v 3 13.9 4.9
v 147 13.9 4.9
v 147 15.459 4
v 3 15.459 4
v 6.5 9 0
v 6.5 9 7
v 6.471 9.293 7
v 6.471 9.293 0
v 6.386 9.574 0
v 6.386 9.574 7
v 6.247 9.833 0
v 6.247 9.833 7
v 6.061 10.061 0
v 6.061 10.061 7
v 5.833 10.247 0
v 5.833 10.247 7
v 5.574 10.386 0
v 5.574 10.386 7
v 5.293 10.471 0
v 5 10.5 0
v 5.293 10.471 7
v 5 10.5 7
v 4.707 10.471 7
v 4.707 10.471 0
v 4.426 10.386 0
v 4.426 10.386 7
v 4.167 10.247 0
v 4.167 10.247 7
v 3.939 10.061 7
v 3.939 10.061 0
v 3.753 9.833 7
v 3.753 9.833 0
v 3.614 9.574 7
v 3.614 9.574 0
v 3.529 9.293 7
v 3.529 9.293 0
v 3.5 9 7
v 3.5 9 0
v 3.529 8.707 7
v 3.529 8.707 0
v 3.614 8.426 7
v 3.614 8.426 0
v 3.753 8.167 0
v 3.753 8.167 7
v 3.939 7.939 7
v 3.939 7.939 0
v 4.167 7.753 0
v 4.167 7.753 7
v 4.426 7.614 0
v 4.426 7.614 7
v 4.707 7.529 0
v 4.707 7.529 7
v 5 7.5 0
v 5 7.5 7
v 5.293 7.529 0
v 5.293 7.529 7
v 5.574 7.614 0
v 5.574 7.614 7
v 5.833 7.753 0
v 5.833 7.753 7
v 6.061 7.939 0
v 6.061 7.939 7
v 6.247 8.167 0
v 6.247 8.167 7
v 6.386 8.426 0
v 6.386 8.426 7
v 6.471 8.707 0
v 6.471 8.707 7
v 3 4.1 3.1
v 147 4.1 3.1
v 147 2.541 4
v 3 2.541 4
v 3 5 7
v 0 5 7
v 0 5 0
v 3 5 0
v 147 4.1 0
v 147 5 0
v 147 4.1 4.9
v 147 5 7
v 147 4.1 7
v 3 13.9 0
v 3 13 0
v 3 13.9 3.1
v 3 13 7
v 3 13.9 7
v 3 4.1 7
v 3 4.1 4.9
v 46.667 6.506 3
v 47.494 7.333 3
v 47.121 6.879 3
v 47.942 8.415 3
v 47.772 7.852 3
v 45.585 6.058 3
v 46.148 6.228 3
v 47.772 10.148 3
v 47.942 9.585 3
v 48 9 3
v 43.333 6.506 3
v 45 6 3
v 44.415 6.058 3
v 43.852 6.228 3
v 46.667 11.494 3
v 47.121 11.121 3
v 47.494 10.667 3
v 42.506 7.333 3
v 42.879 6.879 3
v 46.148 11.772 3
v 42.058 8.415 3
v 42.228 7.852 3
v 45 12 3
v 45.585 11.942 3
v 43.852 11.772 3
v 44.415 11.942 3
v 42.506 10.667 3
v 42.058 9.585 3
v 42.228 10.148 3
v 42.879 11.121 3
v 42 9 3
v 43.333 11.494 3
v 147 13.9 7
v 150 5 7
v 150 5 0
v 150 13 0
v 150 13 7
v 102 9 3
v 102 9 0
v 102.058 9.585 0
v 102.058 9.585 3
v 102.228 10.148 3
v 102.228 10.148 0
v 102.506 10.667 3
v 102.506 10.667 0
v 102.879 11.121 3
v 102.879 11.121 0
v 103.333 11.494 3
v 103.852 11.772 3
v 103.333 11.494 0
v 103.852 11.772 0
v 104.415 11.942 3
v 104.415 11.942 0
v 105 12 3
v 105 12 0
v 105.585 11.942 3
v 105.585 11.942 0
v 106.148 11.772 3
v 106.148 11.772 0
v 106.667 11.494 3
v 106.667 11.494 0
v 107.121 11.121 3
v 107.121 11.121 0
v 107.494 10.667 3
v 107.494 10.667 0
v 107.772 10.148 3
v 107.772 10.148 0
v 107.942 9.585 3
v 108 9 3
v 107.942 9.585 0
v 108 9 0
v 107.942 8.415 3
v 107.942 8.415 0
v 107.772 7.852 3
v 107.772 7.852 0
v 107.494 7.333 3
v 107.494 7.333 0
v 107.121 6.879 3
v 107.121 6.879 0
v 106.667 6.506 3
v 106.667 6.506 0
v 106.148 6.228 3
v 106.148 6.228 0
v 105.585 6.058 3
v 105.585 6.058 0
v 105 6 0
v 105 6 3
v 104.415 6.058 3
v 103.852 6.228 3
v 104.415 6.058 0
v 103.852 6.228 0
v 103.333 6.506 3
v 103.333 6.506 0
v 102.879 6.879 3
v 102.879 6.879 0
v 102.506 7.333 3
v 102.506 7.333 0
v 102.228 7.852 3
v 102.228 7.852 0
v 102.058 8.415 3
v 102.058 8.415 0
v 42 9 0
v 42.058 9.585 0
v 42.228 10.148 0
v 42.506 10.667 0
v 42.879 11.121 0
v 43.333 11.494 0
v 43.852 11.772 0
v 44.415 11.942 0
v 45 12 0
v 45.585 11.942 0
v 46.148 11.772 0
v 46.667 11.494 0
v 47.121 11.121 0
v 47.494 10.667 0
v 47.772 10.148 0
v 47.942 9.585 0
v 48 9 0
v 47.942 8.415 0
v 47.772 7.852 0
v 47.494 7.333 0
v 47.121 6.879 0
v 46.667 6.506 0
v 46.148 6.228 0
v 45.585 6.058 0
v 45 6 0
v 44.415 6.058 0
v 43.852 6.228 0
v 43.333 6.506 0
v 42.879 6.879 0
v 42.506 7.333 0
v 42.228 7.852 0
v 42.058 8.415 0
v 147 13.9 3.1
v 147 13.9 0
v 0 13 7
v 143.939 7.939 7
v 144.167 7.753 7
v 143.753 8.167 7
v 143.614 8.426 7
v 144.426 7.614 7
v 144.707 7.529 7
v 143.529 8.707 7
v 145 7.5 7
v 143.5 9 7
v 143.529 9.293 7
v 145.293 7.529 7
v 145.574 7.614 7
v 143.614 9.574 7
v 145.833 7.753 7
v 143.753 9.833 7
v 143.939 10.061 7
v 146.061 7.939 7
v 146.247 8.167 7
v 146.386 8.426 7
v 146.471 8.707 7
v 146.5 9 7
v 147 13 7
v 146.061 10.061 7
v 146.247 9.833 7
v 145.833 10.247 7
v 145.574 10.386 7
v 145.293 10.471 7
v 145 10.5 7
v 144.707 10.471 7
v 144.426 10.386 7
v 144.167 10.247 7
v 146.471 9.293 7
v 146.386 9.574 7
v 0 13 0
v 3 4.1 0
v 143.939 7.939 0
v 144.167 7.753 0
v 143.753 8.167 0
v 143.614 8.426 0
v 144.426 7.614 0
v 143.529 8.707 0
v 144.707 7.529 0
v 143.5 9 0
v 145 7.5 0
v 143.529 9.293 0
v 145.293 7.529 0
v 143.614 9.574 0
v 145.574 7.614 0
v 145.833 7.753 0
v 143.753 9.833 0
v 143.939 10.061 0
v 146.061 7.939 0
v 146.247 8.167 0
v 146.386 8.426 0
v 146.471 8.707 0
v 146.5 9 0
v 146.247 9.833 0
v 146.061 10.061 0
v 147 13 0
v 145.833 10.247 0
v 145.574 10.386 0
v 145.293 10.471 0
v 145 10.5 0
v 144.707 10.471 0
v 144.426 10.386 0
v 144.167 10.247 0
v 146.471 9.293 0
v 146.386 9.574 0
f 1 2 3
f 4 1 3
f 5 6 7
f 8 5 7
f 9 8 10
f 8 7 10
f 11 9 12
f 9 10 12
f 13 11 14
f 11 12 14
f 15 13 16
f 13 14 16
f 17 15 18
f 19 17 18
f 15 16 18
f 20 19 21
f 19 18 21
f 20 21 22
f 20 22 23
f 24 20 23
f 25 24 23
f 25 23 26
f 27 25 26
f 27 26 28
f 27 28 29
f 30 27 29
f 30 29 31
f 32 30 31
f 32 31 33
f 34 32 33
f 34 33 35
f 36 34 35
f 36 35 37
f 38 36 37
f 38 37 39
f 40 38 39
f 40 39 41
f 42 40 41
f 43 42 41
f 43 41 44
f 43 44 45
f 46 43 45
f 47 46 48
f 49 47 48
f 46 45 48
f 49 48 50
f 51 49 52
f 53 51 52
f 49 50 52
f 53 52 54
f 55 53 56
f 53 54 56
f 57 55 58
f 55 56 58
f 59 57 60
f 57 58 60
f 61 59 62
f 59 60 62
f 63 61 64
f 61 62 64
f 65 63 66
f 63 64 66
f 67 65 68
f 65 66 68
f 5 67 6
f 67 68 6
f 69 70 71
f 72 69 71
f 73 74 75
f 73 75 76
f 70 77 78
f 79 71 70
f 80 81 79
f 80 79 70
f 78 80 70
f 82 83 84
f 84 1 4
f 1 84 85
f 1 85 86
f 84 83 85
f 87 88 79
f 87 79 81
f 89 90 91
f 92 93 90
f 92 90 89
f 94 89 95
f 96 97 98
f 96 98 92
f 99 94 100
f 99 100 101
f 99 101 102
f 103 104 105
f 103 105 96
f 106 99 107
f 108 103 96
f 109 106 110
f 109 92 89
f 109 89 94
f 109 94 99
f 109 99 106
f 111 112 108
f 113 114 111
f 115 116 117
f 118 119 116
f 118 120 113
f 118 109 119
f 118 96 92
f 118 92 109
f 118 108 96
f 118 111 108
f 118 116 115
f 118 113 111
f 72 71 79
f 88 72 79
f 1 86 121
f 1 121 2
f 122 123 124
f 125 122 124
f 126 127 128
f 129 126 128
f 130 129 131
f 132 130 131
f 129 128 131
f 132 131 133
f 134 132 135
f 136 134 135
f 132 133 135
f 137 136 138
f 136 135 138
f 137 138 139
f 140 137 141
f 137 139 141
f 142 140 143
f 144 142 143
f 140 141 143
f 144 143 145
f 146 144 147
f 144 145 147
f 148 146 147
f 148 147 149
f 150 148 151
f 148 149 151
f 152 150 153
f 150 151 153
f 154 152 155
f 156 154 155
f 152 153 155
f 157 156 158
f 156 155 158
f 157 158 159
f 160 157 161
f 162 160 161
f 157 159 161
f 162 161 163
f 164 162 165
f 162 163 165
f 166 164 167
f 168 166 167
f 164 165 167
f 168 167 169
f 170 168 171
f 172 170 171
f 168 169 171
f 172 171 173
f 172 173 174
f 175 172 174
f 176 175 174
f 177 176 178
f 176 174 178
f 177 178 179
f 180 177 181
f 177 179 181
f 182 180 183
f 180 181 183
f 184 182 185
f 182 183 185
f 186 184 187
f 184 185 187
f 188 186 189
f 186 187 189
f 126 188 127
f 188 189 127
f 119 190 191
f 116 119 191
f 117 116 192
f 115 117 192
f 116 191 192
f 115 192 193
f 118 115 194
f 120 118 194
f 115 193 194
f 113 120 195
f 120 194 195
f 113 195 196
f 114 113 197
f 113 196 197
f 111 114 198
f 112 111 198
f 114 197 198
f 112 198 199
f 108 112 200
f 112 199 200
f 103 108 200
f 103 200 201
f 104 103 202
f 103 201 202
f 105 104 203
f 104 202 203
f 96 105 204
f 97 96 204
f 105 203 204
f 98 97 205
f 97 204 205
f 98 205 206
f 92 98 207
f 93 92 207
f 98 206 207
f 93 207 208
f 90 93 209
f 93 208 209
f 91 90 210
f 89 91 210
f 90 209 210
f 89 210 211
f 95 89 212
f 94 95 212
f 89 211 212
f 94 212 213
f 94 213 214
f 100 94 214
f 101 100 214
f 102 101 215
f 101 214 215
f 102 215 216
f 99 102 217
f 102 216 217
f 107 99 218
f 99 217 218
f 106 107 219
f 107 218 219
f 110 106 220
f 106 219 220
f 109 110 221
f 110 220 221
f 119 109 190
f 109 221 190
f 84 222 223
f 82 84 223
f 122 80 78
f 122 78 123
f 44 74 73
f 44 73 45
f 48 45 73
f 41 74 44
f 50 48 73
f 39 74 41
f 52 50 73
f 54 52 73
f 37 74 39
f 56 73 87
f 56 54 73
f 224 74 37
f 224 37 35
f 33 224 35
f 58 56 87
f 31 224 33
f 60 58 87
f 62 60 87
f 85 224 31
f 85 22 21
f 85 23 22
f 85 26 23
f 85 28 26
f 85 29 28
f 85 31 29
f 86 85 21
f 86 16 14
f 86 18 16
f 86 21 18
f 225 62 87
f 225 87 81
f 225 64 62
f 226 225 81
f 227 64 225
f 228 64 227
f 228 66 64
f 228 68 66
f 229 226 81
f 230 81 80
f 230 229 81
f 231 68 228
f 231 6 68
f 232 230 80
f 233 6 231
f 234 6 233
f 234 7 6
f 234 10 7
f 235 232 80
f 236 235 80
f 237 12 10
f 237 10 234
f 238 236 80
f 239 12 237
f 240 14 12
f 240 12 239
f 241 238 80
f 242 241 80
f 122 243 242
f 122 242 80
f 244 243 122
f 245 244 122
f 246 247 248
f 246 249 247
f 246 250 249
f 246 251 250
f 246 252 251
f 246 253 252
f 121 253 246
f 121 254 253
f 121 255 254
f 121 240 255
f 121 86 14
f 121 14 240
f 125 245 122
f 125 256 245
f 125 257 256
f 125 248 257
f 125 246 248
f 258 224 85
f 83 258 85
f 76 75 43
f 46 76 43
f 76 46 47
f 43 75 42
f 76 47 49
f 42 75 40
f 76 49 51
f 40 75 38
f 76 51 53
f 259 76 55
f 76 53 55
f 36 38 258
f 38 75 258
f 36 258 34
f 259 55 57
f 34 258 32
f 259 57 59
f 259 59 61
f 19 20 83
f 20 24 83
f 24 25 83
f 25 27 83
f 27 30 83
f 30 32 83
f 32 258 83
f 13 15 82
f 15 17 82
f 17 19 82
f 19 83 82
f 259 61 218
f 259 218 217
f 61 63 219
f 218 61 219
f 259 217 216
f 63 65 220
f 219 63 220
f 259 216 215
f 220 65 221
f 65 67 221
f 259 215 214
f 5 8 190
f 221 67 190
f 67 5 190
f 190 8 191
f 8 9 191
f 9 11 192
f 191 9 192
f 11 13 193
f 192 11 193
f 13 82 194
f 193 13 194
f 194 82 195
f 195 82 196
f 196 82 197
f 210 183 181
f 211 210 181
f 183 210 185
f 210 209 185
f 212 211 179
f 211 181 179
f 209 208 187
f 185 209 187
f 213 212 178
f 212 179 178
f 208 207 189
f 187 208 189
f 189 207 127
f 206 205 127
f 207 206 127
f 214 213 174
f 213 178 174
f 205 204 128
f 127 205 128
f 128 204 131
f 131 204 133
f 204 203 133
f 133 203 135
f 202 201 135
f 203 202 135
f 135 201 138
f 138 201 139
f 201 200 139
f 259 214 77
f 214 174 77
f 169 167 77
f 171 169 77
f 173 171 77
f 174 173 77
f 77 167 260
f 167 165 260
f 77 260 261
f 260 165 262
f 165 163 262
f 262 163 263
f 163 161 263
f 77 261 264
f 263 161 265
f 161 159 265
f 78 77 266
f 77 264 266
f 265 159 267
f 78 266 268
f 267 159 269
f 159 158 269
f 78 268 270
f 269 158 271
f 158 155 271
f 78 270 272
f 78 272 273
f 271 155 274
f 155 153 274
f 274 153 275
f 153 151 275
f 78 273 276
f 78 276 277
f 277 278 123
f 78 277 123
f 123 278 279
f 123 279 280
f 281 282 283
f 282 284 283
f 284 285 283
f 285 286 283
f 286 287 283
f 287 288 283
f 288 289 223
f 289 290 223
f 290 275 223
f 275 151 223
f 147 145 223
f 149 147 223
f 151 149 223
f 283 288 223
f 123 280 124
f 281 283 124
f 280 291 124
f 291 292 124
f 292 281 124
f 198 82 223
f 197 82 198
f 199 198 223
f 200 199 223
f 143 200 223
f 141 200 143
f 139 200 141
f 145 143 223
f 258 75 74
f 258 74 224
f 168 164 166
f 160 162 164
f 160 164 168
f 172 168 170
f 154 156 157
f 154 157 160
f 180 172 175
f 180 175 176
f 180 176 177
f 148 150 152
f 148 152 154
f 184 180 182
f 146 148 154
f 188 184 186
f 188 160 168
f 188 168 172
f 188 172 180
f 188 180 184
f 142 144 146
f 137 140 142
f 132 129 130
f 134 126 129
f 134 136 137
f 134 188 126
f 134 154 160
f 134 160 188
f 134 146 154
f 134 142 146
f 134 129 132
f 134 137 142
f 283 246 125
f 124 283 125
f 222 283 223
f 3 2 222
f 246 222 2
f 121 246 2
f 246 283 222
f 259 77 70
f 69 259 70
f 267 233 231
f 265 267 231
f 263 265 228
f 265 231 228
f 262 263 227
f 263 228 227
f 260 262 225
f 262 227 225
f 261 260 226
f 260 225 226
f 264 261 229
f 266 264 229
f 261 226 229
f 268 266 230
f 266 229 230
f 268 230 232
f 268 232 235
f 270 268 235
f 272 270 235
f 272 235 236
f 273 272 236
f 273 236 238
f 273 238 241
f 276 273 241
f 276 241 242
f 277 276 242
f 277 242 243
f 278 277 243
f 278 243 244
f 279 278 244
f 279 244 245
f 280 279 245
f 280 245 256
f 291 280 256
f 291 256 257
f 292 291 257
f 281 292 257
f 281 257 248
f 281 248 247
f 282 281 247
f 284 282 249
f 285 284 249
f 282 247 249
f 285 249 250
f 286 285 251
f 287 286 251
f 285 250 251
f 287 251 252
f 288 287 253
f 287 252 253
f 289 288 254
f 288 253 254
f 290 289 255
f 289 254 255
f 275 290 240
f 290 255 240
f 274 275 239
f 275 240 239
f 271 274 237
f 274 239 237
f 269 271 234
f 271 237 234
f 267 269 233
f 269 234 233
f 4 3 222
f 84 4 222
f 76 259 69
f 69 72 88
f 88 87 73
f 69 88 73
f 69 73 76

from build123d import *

# Parameters (mm, degrees)
SKETCH_1_W          = 150
SKETCH_1_H          = 18
EXTRUDE_1_DEPTH     = 7
CUT_EXTRUDE_1_REACH = 153.238
SKETCH_3_R          = 1.5
CUT_EXTRUDE_2_REACH = 153.238
CUT_EXTRUDE_3_REACH = 152.957
SKETCH_5_W          = 3
SKETCH_5_H          = 2.458845727
SKETCH_6_R          = 3
CUT_EXTRUDE_4_DEPTH = 3


with BuildPart() as part:
    # 草图1 → 凸台-拉伸1 (new body)
    with BuildSketch(Plane.XY):
        with Locations((75, 9)):
            Rectangle(SKETCH_1_W, SKETCH_1_H)
    extrude(amount=EXTRUDE_1_DEPTH)

    # 草图3 → 切除-拉伸1 (cut, up to next)
    with BuildSketch(Plane.XY.offset(7), mode=Mode.PRIVATE) as cut_extrude_1_sk1:
        with Locations((5, 9)):
            Circle(SKETCH_3_R)
    cut_extrude_1_tool1 = extrude(cut_extrude_1_sk1.sketch, amount=-CUT_EXTRUDE_1_REACH, mode=Mode.PRIVATE) & part.part
    # 草图3 → 切除-拉伸1 (cut, up to next)
    with BuildSketch(Plane.XY.offset(7), mode=Mode.PRIVATE) as cut_extrude_1_sk2:
        with Locations(Location((145, 9, 0), (0, 0, 180))):
            Circle(SKETCH_3_R)
    cut_extrude_1_tool2 = extrude(cut_extrude_1_sk2.sketch, amount=-CUT_EXTRUDE_1_REACH, mode=Mode.PRIVATE) & part.part
    add(cut_extrude_1_tool1.solids().sort_by_distance((5, 9, 7))[0], mode=Mode.SUBTRACT)
    add(cut_extrude_1_tool2.solids().sort_by_distance((145, 9, 7))[0], mode=Mode.SUBTRACT)

    # 草图2 → 切除-拉伸2 (cut, up to next)
    with BuildSketch(Plane(origin=(150, 0, 0), x_dir=(0, 0, -1), z_dir=(1, 0, 0)), mode=Mode.PRIVATE) as cut_extrude_2_sk1:
        Polygon((-7, 18), (-7, 13.9), (-4.9, 13.9), (-4, 15.458845727), (-3.1, 13.9), (0, 13.9), (0, 18), align=None)
    cut_extrude_2_tool1 = extrude(cut_extrude_2_sk1.sketch, amount=-CUT_EXTRUDE_2_REACH, mode=Mode.PRIVATE) & part.part
    # 草图2 → 切除-拉伸2 (cut, up to next)
    with BuildSketch(Plane(origin=(150, 0, 0), x_dir=(0, 0, -1), z_dir=(1, 0, 0)), mode=Mode.PRIVATE) as cut_extrude_2_sk2:
        Polygon((-4.9, 4.1), (-7, 4.1), (-7, 0), (0, 0), (0, 4.1), (-3.1, 4.1), (-4, 2.541154273), align=None)
    cut_extrude_2_tool2 = extrude(cut_extrude_2_sk2.sketch, amount=-CUT_EXTRUDE_2_REACH, mode=Mode.PRIVATE) & part.part
    add(cut_extrude_2_tool1.solids().sort_by_distance((150, 16.028656, 3.474302))[0], mode=Mode.SUBTRACT)
    add(cut_extrude_2_tool2.solids().sort_by_distance((150, 1.971344, 3.474302))[0], mode=Mode.SUBTRACT)

    # 草图5 → 切除-拉伸3 (cut, up to next)
    with BuildSketch(Plane.XY.offset(7), mode=Mode.PRIVATE) as cut_extrude_3_sk1:
        with Locations((1.5, 14.229422864)):
            Rectangle(SKETCH_5_W, SKETCH_5_H)
    cut_extrude_3_tool1 = extrude(cut_extrude_3_sk1.sketch, amount=-CUT_EXTRUDE_3_REACH, mode=Mode.PRIVATE) & part.part
    # 草图5 → 切除-拉伸3 (cut, up to next)
    with BuildSketch(Plane.XY.offset(7), mode=Mode.PRIVATE) as cut_extrude_3_sk2:
        with Locations((1.5, 3.770577137)):
            Rectangle(SKETCH_5_W, SKETCH_5_H)
    cut_extrude_3_tool2 = extrude(cut_extrude_3_sk2.sketch, amount=-CUT_EXTRUDE_3_REACH, mode=Mode.PRIVATE) & part.part
    # 草图5 → 切除-拉伸3 (cut, up to next)
    with BuildSketch(Plane.XY.offset(7), mode=Mode.PRIVATE) as cut_extrude_3_sk3:
        with Locations((148.5, 3.770577137)):
            Rectangle(SKETCH_5_W, SKETCH_5_H)
    cut_extrude_3_tool3 = extrude(cut_extrude_3_sk3.sketch, amount=-CUT_EXTRUDE_3_REACH, mode=Mode.PRIVATE) & part.part
    # 草图5 → 切除-拉伸3 (cut, up to next)
    with BuildSketch(Plane.XY.offset(7), mode=Mode.PRIVATE) as cut_extrude_3_sk4:
        with Locations((148.5, 14.229422864)):
            Rectangle(SKETCH_5_W, SKETCH_5_H)
    cut_extrude_3_tool4 = extrude(cut_extrude_3_sk4.sketch, amount=-CUT_EXTRUDE_3_REACH, mode=Mode.PRIVATE) & part.part
    add(cut_extrude_3_tool1.solids().sort_by_distance((1.5, 14.229423, 7))[0], mode=Mode.SUBTRACT)
    add(cut_extrude_3_tool2.solids().sort_by_distance((1.5, 3.770577, 7))[0], mode=Mode.SUBTRACT)
    add(cut_extrude_3_tool3.solids().sort_by_distance((148.5, 3.770577, 7))[0], mode=Mode.SUBTRACT)
    add(cut_extrude_3_tool4.solids().sort_by_distance((148.5, 14.229423, 7))[0], mode=Mode.SUBTRACT)

    # 草图6 → 切除-拉伸4 (cut)
    with BuildSketch(Plane(origin=(0, 0, 0), x_dir=(-1, 0, 0), z_dir=(0, 0, -1))):
        with Locations((-105, 9)):
            Circle(SKETCH_6_R)
        with Locations((-45, 9)):
            Circle(SKETCH_6_R)
    extrude(amount=-CUT_EXTRUDE_4_DEPTH, mode=Mode.SUBTRACT)


solid = part.part
